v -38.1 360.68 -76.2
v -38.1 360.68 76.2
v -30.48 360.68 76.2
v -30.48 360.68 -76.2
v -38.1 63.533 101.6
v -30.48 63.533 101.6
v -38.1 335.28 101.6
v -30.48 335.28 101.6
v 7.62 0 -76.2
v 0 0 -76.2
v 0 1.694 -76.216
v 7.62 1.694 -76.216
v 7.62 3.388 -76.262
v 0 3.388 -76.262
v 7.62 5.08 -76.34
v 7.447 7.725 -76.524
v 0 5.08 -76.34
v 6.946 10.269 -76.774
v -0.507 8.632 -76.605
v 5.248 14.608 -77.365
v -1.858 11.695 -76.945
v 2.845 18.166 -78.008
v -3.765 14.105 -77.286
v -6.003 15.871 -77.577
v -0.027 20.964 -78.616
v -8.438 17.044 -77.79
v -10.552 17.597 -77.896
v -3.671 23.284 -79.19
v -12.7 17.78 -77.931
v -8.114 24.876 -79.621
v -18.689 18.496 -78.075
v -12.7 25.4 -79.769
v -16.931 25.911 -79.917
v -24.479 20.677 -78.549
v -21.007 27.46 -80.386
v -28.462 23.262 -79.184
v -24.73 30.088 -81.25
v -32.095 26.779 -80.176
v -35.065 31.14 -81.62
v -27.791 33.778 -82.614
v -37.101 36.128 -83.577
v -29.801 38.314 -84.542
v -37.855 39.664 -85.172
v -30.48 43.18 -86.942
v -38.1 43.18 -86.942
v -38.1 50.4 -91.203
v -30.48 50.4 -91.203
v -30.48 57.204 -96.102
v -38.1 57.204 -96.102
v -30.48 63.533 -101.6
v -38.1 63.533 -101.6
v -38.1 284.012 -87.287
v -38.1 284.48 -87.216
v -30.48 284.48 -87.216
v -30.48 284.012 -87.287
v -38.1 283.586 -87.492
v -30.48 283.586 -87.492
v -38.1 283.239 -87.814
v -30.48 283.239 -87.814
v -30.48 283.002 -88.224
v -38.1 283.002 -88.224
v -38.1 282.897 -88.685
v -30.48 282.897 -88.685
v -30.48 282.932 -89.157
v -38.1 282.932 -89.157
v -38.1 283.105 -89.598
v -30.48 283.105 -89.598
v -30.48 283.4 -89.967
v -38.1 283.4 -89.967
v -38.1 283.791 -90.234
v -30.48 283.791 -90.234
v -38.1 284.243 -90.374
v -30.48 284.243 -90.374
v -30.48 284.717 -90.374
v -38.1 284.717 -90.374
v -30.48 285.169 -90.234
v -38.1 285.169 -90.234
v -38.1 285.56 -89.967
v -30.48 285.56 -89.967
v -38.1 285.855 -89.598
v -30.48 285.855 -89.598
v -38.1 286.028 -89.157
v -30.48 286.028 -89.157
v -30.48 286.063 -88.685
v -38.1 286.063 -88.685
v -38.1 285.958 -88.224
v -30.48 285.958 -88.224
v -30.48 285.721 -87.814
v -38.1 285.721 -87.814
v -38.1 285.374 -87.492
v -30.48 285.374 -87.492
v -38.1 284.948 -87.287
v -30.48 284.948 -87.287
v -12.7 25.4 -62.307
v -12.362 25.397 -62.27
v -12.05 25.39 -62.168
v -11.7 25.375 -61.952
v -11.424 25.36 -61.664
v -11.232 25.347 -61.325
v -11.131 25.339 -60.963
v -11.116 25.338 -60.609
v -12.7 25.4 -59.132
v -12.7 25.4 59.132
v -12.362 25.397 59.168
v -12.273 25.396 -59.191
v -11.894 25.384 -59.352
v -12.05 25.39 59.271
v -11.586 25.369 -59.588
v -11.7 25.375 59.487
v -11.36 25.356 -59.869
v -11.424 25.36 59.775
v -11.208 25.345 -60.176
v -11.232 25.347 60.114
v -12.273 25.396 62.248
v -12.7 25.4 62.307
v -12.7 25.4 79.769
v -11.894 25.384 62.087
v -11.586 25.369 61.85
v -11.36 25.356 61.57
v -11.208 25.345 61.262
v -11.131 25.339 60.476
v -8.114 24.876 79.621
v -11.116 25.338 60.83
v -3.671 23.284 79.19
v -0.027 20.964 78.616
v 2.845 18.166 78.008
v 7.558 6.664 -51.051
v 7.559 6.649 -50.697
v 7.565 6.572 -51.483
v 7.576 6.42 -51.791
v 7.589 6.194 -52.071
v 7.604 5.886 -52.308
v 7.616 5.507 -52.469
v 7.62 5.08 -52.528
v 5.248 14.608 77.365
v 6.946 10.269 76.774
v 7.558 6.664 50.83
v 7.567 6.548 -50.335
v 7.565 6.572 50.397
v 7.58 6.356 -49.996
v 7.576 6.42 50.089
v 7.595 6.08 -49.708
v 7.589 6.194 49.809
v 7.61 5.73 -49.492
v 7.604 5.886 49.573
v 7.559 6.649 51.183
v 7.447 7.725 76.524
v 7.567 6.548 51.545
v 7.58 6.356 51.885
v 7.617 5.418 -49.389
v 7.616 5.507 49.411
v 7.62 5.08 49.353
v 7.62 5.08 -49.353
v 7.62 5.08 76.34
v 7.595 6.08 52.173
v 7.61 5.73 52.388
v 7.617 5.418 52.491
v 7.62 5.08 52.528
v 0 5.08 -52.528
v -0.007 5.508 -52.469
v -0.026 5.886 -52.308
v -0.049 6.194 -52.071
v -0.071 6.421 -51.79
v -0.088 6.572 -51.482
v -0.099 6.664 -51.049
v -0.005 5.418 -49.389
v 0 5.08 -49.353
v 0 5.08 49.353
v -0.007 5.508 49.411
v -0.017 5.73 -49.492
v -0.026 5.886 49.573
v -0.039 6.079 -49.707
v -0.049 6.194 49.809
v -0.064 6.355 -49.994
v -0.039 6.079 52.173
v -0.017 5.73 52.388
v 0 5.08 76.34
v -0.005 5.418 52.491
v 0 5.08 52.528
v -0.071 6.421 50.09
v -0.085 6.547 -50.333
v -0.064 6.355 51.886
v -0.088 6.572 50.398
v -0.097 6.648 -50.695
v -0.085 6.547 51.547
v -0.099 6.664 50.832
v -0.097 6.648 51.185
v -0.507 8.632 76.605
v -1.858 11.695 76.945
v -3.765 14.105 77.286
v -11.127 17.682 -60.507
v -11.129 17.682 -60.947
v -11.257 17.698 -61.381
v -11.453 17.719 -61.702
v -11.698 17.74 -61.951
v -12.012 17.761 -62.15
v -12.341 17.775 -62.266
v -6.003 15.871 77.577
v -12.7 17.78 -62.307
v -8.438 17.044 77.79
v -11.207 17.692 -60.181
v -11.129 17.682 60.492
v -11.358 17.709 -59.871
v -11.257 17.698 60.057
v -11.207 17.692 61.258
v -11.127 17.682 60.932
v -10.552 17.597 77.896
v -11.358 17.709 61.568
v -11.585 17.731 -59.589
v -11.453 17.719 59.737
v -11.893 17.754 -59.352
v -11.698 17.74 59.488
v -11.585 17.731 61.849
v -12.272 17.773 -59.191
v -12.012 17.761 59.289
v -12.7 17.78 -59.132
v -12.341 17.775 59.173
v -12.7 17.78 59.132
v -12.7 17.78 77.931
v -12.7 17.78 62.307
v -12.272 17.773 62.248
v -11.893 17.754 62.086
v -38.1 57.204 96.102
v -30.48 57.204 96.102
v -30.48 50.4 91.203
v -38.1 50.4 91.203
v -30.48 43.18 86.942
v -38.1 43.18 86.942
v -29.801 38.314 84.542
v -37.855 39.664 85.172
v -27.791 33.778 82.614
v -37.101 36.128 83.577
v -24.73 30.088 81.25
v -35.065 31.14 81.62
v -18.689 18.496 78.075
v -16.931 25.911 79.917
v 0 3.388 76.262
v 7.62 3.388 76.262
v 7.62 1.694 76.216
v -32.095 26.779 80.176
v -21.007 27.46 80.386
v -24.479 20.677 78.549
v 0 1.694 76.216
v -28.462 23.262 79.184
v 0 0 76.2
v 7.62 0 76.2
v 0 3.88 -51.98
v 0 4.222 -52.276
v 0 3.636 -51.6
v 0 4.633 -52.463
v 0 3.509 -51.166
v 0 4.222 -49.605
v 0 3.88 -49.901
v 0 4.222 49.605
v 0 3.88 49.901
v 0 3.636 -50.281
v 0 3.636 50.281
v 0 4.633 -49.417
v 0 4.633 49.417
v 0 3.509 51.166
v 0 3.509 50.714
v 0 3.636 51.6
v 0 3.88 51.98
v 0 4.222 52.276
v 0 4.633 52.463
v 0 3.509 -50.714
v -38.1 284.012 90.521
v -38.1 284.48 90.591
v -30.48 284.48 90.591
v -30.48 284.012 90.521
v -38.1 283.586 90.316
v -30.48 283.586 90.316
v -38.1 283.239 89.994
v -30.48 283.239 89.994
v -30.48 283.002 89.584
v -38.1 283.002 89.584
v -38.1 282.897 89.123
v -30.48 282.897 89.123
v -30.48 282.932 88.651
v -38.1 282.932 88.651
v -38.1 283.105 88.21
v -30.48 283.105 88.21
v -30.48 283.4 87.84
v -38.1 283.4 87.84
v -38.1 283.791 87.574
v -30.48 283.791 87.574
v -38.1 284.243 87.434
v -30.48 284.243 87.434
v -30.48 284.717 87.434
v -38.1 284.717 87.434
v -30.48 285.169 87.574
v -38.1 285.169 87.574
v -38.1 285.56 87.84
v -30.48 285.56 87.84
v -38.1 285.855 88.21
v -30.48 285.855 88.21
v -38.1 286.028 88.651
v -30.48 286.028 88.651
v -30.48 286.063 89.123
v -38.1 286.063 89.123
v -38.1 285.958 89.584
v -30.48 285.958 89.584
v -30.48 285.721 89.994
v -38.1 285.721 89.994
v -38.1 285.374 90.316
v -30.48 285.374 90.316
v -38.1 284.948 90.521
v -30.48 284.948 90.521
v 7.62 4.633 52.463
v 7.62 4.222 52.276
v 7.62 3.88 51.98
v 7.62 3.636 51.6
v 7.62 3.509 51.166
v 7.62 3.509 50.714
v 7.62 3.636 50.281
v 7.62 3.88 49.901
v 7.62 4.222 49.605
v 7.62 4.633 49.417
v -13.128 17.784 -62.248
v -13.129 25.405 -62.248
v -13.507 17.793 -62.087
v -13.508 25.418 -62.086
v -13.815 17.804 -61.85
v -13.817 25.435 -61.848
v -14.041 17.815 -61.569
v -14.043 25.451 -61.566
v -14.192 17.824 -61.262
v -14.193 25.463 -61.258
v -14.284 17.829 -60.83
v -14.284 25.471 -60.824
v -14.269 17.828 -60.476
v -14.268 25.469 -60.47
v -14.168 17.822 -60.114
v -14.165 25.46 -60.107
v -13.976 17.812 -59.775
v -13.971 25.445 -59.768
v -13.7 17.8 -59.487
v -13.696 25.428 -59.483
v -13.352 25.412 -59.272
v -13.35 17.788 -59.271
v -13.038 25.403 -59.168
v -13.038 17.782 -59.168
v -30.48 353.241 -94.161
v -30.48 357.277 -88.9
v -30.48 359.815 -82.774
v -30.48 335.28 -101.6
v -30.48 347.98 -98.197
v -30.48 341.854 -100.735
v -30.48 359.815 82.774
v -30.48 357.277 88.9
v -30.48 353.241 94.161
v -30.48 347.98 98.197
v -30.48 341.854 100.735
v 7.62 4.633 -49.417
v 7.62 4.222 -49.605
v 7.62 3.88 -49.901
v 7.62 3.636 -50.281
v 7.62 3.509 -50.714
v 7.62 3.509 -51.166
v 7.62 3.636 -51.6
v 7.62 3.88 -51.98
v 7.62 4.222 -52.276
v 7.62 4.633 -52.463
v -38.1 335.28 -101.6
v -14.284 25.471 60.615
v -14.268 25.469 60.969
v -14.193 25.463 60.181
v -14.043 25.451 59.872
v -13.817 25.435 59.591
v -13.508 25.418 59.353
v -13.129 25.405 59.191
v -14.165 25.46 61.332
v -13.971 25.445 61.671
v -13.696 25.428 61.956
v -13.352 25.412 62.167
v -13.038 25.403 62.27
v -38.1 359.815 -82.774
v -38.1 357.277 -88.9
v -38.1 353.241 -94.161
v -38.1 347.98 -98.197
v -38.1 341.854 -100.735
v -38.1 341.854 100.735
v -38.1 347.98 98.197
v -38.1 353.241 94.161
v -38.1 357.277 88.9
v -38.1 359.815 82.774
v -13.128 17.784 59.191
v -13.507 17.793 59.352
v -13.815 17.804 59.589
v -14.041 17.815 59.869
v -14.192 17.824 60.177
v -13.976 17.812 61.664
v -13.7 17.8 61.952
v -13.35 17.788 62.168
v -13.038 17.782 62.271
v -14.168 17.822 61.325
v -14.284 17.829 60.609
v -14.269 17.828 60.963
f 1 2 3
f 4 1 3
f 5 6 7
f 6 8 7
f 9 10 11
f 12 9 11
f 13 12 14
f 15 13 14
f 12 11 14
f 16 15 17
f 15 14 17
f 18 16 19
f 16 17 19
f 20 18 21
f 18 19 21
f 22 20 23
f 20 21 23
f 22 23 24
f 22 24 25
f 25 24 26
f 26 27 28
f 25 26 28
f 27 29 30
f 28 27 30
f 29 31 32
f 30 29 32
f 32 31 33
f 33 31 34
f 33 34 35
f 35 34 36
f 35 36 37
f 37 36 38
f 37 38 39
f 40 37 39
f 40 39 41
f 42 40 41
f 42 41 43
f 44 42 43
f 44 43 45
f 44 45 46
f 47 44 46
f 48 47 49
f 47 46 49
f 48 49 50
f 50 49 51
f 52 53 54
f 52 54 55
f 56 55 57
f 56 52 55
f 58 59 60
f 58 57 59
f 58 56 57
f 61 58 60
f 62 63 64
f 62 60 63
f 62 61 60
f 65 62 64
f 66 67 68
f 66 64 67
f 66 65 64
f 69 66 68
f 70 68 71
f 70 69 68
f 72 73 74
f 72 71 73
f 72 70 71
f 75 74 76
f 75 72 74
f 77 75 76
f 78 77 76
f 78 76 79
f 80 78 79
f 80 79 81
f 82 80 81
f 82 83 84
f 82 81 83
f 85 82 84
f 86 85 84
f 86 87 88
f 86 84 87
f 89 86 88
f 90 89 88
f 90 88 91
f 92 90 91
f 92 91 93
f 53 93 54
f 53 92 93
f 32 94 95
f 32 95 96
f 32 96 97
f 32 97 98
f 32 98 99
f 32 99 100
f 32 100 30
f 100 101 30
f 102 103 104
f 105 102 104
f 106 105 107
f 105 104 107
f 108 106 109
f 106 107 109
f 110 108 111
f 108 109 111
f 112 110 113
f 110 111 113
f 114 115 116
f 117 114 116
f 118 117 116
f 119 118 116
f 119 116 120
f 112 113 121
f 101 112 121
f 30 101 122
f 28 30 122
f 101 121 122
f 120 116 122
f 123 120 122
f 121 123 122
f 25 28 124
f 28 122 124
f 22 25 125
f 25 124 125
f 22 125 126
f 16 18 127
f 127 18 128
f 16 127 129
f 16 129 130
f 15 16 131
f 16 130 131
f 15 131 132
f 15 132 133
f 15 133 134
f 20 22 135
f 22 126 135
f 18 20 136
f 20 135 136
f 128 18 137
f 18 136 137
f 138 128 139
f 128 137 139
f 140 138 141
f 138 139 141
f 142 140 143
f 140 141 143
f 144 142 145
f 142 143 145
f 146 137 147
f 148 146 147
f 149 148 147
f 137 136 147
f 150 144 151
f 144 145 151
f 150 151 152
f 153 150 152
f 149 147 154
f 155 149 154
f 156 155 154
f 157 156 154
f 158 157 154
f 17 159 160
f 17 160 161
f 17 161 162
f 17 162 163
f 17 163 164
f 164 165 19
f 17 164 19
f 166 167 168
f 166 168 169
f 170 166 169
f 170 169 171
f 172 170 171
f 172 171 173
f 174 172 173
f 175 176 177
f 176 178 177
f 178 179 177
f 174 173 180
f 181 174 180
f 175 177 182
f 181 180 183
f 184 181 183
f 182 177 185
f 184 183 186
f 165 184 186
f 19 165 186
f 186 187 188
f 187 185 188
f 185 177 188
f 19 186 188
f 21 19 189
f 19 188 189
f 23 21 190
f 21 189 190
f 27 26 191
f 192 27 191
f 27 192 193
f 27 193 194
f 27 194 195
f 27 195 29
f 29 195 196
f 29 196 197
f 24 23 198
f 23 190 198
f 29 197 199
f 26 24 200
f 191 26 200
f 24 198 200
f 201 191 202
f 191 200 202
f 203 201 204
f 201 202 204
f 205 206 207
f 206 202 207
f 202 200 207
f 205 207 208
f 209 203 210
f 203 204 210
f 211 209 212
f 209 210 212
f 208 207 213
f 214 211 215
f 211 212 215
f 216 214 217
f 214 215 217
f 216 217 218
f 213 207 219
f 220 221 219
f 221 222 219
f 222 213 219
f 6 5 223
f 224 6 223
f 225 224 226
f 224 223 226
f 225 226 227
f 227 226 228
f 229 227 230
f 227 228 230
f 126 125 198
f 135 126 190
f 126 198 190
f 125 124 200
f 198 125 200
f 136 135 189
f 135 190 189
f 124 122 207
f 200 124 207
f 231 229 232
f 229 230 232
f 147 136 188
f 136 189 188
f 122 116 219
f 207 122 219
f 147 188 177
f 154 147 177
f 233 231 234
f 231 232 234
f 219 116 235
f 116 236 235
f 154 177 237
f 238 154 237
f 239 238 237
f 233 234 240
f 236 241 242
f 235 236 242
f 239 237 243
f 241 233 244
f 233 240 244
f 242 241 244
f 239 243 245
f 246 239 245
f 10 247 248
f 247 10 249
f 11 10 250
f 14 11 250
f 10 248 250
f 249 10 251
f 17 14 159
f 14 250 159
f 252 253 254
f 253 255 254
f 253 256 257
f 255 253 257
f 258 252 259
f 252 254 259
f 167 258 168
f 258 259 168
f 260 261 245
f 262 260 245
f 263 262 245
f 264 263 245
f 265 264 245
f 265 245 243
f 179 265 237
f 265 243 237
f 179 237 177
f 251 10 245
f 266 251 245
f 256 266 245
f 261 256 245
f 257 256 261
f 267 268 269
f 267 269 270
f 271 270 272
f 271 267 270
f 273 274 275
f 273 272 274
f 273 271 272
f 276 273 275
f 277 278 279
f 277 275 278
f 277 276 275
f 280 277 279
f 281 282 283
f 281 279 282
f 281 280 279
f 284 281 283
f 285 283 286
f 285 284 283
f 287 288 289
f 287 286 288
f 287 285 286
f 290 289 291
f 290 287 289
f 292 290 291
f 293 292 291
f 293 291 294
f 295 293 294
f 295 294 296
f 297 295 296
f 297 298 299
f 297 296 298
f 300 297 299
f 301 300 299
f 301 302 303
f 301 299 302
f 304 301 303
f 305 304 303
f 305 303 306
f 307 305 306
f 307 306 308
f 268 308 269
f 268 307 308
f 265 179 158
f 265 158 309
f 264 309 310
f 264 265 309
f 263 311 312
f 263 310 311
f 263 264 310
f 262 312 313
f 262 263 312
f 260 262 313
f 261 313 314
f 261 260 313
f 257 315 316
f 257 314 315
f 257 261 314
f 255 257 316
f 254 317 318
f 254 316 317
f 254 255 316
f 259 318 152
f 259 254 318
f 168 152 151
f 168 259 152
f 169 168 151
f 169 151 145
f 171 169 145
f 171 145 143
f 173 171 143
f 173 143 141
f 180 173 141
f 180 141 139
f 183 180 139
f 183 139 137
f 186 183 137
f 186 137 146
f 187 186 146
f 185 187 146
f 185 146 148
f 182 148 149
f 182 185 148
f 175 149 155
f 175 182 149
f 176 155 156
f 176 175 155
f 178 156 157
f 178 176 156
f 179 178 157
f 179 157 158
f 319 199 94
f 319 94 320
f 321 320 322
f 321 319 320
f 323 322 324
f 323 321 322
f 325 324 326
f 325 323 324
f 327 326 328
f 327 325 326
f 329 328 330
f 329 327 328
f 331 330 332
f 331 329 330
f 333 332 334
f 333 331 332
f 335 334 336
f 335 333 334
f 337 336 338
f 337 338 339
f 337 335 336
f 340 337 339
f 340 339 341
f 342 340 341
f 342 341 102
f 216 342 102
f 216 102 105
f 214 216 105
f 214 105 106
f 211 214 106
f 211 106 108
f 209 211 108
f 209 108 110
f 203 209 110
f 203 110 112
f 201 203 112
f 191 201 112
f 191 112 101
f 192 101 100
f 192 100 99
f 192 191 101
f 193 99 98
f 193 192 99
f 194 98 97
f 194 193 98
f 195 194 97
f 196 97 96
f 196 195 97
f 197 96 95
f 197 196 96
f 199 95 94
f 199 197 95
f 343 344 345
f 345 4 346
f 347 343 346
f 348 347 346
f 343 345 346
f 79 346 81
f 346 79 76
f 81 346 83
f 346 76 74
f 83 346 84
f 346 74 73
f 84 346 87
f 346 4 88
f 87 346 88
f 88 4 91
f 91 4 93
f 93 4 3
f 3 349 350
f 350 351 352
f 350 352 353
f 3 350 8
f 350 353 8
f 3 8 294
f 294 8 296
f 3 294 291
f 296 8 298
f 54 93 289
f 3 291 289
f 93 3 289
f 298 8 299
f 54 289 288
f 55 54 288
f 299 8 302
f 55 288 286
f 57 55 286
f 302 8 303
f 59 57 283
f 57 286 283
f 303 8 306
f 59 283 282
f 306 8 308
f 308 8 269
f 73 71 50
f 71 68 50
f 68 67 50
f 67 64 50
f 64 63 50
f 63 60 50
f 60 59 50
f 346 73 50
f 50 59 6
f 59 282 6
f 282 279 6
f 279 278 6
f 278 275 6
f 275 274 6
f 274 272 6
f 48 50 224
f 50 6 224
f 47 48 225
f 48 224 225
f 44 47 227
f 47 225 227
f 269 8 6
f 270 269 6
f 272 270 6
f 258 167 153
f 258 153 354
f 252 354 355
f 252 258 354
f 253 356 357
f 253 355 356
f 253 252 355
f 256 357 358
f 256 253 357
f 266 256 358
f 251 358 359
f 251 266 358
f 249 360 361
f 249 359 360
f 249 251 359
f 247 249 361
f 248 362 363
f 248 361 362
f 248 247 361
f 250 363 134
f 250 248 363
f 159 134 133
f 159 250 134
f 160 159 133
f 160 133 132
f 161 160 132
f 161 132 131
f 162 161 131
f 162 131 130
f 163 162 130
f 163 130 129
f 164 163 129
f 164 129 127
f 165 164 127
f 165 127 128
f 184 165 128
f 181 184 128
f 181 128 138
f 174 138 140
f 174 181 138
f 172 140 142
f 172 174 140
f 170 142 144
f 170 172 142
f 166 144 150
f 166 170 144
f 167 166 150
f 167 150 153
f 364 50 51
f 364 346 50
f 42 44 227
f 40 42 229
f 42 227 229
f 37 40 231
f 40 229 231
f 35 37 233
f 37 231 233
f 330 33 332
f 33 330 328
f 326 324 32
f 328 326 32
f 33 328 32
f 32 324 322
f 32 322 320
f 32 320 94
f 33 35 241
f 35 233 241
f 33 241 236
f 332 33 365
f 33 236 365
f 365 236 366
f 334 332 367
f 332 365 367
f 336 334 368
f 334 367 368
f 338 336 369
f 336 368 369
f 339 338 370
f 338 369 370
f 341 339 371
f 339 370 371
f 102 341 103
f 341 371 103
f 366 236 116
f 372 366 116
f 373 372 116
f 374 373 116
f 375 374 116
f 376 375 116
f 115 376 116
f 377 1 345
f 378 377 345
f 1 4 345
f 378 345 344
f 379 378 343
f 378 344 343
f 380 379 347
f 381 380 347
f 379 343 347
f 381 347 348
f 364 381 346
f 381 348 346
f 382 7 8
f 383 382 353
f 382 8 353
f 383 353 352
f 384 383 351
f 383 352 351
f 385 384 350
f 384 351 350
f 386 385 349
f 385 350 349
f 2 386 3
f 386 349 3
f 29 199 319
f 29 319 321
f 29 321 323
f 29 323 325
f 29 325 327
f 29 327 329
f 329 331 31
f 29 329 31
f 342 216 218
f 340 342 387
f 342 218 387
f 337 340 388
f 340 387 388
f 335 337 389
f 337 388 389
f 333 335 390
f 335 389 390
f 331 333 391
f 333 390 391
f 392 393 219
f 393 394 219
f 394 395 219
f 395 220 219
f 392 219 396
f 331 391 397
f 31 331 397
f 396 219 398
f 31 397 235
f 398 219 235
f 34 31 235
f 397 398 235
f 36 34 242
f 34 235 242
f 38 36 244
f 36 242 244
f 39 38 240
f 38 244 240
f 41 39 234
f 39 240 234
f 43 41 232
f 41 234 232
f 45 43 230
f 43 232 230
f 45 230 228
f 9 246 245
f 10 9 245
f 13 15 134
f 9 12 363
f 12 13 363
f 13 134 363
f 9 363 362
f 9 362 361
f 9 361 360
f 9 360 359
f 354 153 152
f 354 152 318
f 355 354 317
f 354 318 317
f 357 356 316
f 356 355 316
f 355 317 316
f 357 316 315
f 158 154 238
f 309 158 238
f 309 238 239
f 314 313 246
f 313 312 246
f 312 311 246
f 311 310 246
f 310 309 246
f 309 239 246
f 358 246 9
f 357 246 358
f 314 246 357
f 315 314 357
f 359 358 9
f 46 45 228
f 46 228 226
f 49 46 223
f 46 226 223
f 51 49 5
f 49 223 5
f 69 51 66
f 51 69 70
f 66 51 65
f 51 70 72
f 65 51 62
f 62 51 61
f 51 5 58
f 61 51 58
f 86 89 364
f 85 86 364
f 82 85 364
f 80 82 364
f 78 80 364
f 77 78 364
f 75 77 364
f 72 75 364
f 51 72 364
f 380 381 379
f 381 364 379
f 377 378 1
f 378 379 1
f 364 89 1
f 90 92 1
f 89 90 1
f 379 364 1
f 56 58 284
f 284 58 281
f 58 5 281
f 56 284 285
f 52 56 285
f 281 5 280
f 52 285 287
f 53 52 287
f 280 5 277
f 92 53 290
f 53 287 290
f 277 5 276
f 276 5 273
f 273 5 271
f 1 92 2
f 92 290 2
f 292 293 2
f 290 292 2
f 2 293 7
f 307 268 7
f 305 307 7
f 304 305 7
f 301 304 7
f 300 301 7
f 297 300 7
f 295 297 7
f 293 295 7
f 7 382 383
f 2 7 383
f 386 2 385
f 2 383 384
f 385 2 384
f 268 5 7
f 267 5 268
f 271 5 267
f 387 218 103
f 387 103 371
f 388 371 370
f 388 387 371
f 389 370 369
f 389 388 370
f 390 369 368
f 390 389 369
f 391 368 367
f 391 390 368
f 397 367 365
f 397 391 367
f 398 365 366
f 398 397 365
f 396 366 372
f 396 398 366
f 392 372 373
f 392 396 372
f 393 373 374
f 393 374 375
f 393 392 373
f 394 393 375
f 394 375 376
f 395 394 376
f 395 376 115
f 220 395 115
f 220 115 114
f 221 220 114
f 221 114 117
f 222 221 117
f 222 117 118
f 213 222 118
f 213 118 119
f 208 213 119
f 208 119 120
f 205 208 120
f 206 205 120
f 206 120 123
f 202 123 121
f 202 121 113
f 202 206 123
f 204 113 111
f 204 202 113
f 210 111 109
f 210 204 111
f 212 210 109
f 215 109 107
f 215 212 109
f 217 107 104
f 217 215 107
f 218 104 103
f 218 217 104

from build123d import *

# Parameters (mm, degrees)
EXTRUDE_THIN1_DEPTH     = 101.6
FILLET1_R               = 25.4
FILLET2_R               = 25.4
CUT_EXTRUDE1_DEPTH      = 10.922
CUT_EXTRUDE1_DEPTH_BACK = 54.61
CUT_EXTRUDE2_DEPTH      = 14.224
CUT_EXTRUDE2_DEPTH_BACK = 17.78
SKETCH4_R               = 1.5875
CUT_EXTRUDE3_DEPTH      = 14.732
CUT_EXTRUDE3_DEPTH_BACK = 23.876
SKETCH5_R               = 1.5875
CUT_EXTRUDE5_DEPTH      = 15.24
CUT_EXTRUDE5_DEPTH_BACK = 39.37
SKETCH6_R               = 1.5875


with BuildPart() as part:
    # Sketch1 → Extrude-Thin1 (new, symmetric)
    with BuildSketch(Plane.XY):
        with BuildLine():
            Line((0, 0), (0, 5.08))
            ThreePointArc((0, 5.08), (-3.719743879, 14.060256121), (-12.7, 17.78))
            ThreePointArc((-12.7, 17.78), (-30.660512242, 25.219487758), (-38.1, 43.18))
            Line((-38.1, 43.18), (-38.1, 360.68))
            Line((-38.1, 360.68), (-30.48, 360.68))
            Line((-30.48, 360.68), (-30.48, 43.18))
            ThreePointArc((-30.48, 43.18), (-25.272358569, 30.607641431), (-12.7, 25.4))
            ThreePointArc((-12.7, 25.4), (1.668409794, 19.448409794), (7.62, 5.08))
            Line((7.62, 5.08), (7.62, 0))
            Line((7.62, 0), (0, 0))
        make_face()
    extrude(amount=EXTRUDE_THIN1_DEPTH, both=True)

    # Fillet1
    fillet1_edges = [part.edges().sort_by_distance(p)[0] for p in [
        (-34.29, 360.68, 101.6),
    ]]
    fillet(fillet1_edges, radius=FILLET1_R)

    # Fillet2
    fillet2_edges = [part.edges().sort_by_distance(p)[0] for p in [
        (-34.29, 360.68, -101.6),
    ]]
    fillet(fillet2_edges, radius=FILLET2_R)

    # Sketch3 → Cut-Extrude1 (cut, two sides: drawn at the far end of the back side and taken through both)
    with BuildSketch(Plane(origin=(7.62, 0, 0), x_dir=(0, 0, -1), z_dir=(1, 0, 0)).offset(-CUT_EXTRUDE1_DEPTH_BACK)):
        with BuildLine():
            Line((-101.6, 0), (-101.6, 63.533291796))
            ThreePointArc((-101.6, 63.533291796), (-82.785279567, 34.211252412), (-76.2, 0))
            Line((-76.2, 0), (-101.6, 0))
        make_face()
        with BuildLine():
            Line((101.6, 0), (76.2, 0))
            ThreePointArc((76.2, 0), (82.785279567, 34.211252412), (101.6, 63.533291796))
            Line((101.6, 63.533291796), (101.6, 0))
        make_face()
    extrude(amount=CUT_EXTRUDE1_DEPTH + CUT_EXTRUDE1_DEPTH_BACK, mode=Mode.SUBTRACT)

    # Sketch4 → Cut-Extrude2 (cut, two sides: drawn at the far end of the back side and taken through both)
    with BuildSketch(Plane(origin=(-30.48, 0, 0), x_dir=(0, 0, -1), z_dir=(1, 0, 0)).offset(-CUT_EXTRUDE2_DEPTH_BACK)):
        with Locations(Location((-89.003908419, 284.48, 0), (0, 0, 180))):
            Circle(SKETCH4_R)
        with Locations(Location((88.803751124, 284.48, 0), (0, 0, 180))):
            Circle(SKETCH4_R)
    extrude(amount=CUT_EXTRUDE2_DEPTH + CUT_EXTRUDE2_DEPTH_BACK, mode=Mode.SUBTRACT)

    # Sketch5 → Cut-Extrude3 (cut, two sides: drawn at the far end of the back side and taken through both)
    with BuildSketch(Plane(origin=(0, 25.4, 0), x_dir=(1, 0, 0), z_dir=(0, 1, 0)).offset(-CUT_EXTRUDE3_DEPTH_BACK)):
        with Locations(Location((-12.7, -60.719407292, 0), (0, 0, 90))):
            Circle(SKETCH5_R)
        with Locations(Location((-12.7, 60.719407292, 0), (0, 0, 90))):
            Circle(SKETCH5_R)
    extrude(amount=CUT_EXTRUDE3_DEPTH + CUT_EXTRUDE3_DEPTH_BACK, mode=Mode.SUBTRACT)

    # Sketch6 → Cut-Extrude5 (cut, two sides: drawn at the far end of the back side and taken through both)
    with BuildSketch(Plane(origin=(7.62, 0, 0), x_dir=(0, 0, -1), z_dir=(1, 0, 0)).offset(-CUT_EXTRUDE5_DEPTH_BACK)):
        with Locations(Location((-50.940117855, 5.08, 0), (0, 0, 180))):
            Circle(SKETCH6_R)
        with Locations(Location((50.940117855, 5.08, 0), (0, 0, 180))):
            Circle(SKETCH6_R)
    extrude(amount=CUT_EXTRUDE5_DEPTH + CUT_EXTRUDE5_DEPTH_BACK, mode=Mode.SUBTRACT)


solid = part.part
